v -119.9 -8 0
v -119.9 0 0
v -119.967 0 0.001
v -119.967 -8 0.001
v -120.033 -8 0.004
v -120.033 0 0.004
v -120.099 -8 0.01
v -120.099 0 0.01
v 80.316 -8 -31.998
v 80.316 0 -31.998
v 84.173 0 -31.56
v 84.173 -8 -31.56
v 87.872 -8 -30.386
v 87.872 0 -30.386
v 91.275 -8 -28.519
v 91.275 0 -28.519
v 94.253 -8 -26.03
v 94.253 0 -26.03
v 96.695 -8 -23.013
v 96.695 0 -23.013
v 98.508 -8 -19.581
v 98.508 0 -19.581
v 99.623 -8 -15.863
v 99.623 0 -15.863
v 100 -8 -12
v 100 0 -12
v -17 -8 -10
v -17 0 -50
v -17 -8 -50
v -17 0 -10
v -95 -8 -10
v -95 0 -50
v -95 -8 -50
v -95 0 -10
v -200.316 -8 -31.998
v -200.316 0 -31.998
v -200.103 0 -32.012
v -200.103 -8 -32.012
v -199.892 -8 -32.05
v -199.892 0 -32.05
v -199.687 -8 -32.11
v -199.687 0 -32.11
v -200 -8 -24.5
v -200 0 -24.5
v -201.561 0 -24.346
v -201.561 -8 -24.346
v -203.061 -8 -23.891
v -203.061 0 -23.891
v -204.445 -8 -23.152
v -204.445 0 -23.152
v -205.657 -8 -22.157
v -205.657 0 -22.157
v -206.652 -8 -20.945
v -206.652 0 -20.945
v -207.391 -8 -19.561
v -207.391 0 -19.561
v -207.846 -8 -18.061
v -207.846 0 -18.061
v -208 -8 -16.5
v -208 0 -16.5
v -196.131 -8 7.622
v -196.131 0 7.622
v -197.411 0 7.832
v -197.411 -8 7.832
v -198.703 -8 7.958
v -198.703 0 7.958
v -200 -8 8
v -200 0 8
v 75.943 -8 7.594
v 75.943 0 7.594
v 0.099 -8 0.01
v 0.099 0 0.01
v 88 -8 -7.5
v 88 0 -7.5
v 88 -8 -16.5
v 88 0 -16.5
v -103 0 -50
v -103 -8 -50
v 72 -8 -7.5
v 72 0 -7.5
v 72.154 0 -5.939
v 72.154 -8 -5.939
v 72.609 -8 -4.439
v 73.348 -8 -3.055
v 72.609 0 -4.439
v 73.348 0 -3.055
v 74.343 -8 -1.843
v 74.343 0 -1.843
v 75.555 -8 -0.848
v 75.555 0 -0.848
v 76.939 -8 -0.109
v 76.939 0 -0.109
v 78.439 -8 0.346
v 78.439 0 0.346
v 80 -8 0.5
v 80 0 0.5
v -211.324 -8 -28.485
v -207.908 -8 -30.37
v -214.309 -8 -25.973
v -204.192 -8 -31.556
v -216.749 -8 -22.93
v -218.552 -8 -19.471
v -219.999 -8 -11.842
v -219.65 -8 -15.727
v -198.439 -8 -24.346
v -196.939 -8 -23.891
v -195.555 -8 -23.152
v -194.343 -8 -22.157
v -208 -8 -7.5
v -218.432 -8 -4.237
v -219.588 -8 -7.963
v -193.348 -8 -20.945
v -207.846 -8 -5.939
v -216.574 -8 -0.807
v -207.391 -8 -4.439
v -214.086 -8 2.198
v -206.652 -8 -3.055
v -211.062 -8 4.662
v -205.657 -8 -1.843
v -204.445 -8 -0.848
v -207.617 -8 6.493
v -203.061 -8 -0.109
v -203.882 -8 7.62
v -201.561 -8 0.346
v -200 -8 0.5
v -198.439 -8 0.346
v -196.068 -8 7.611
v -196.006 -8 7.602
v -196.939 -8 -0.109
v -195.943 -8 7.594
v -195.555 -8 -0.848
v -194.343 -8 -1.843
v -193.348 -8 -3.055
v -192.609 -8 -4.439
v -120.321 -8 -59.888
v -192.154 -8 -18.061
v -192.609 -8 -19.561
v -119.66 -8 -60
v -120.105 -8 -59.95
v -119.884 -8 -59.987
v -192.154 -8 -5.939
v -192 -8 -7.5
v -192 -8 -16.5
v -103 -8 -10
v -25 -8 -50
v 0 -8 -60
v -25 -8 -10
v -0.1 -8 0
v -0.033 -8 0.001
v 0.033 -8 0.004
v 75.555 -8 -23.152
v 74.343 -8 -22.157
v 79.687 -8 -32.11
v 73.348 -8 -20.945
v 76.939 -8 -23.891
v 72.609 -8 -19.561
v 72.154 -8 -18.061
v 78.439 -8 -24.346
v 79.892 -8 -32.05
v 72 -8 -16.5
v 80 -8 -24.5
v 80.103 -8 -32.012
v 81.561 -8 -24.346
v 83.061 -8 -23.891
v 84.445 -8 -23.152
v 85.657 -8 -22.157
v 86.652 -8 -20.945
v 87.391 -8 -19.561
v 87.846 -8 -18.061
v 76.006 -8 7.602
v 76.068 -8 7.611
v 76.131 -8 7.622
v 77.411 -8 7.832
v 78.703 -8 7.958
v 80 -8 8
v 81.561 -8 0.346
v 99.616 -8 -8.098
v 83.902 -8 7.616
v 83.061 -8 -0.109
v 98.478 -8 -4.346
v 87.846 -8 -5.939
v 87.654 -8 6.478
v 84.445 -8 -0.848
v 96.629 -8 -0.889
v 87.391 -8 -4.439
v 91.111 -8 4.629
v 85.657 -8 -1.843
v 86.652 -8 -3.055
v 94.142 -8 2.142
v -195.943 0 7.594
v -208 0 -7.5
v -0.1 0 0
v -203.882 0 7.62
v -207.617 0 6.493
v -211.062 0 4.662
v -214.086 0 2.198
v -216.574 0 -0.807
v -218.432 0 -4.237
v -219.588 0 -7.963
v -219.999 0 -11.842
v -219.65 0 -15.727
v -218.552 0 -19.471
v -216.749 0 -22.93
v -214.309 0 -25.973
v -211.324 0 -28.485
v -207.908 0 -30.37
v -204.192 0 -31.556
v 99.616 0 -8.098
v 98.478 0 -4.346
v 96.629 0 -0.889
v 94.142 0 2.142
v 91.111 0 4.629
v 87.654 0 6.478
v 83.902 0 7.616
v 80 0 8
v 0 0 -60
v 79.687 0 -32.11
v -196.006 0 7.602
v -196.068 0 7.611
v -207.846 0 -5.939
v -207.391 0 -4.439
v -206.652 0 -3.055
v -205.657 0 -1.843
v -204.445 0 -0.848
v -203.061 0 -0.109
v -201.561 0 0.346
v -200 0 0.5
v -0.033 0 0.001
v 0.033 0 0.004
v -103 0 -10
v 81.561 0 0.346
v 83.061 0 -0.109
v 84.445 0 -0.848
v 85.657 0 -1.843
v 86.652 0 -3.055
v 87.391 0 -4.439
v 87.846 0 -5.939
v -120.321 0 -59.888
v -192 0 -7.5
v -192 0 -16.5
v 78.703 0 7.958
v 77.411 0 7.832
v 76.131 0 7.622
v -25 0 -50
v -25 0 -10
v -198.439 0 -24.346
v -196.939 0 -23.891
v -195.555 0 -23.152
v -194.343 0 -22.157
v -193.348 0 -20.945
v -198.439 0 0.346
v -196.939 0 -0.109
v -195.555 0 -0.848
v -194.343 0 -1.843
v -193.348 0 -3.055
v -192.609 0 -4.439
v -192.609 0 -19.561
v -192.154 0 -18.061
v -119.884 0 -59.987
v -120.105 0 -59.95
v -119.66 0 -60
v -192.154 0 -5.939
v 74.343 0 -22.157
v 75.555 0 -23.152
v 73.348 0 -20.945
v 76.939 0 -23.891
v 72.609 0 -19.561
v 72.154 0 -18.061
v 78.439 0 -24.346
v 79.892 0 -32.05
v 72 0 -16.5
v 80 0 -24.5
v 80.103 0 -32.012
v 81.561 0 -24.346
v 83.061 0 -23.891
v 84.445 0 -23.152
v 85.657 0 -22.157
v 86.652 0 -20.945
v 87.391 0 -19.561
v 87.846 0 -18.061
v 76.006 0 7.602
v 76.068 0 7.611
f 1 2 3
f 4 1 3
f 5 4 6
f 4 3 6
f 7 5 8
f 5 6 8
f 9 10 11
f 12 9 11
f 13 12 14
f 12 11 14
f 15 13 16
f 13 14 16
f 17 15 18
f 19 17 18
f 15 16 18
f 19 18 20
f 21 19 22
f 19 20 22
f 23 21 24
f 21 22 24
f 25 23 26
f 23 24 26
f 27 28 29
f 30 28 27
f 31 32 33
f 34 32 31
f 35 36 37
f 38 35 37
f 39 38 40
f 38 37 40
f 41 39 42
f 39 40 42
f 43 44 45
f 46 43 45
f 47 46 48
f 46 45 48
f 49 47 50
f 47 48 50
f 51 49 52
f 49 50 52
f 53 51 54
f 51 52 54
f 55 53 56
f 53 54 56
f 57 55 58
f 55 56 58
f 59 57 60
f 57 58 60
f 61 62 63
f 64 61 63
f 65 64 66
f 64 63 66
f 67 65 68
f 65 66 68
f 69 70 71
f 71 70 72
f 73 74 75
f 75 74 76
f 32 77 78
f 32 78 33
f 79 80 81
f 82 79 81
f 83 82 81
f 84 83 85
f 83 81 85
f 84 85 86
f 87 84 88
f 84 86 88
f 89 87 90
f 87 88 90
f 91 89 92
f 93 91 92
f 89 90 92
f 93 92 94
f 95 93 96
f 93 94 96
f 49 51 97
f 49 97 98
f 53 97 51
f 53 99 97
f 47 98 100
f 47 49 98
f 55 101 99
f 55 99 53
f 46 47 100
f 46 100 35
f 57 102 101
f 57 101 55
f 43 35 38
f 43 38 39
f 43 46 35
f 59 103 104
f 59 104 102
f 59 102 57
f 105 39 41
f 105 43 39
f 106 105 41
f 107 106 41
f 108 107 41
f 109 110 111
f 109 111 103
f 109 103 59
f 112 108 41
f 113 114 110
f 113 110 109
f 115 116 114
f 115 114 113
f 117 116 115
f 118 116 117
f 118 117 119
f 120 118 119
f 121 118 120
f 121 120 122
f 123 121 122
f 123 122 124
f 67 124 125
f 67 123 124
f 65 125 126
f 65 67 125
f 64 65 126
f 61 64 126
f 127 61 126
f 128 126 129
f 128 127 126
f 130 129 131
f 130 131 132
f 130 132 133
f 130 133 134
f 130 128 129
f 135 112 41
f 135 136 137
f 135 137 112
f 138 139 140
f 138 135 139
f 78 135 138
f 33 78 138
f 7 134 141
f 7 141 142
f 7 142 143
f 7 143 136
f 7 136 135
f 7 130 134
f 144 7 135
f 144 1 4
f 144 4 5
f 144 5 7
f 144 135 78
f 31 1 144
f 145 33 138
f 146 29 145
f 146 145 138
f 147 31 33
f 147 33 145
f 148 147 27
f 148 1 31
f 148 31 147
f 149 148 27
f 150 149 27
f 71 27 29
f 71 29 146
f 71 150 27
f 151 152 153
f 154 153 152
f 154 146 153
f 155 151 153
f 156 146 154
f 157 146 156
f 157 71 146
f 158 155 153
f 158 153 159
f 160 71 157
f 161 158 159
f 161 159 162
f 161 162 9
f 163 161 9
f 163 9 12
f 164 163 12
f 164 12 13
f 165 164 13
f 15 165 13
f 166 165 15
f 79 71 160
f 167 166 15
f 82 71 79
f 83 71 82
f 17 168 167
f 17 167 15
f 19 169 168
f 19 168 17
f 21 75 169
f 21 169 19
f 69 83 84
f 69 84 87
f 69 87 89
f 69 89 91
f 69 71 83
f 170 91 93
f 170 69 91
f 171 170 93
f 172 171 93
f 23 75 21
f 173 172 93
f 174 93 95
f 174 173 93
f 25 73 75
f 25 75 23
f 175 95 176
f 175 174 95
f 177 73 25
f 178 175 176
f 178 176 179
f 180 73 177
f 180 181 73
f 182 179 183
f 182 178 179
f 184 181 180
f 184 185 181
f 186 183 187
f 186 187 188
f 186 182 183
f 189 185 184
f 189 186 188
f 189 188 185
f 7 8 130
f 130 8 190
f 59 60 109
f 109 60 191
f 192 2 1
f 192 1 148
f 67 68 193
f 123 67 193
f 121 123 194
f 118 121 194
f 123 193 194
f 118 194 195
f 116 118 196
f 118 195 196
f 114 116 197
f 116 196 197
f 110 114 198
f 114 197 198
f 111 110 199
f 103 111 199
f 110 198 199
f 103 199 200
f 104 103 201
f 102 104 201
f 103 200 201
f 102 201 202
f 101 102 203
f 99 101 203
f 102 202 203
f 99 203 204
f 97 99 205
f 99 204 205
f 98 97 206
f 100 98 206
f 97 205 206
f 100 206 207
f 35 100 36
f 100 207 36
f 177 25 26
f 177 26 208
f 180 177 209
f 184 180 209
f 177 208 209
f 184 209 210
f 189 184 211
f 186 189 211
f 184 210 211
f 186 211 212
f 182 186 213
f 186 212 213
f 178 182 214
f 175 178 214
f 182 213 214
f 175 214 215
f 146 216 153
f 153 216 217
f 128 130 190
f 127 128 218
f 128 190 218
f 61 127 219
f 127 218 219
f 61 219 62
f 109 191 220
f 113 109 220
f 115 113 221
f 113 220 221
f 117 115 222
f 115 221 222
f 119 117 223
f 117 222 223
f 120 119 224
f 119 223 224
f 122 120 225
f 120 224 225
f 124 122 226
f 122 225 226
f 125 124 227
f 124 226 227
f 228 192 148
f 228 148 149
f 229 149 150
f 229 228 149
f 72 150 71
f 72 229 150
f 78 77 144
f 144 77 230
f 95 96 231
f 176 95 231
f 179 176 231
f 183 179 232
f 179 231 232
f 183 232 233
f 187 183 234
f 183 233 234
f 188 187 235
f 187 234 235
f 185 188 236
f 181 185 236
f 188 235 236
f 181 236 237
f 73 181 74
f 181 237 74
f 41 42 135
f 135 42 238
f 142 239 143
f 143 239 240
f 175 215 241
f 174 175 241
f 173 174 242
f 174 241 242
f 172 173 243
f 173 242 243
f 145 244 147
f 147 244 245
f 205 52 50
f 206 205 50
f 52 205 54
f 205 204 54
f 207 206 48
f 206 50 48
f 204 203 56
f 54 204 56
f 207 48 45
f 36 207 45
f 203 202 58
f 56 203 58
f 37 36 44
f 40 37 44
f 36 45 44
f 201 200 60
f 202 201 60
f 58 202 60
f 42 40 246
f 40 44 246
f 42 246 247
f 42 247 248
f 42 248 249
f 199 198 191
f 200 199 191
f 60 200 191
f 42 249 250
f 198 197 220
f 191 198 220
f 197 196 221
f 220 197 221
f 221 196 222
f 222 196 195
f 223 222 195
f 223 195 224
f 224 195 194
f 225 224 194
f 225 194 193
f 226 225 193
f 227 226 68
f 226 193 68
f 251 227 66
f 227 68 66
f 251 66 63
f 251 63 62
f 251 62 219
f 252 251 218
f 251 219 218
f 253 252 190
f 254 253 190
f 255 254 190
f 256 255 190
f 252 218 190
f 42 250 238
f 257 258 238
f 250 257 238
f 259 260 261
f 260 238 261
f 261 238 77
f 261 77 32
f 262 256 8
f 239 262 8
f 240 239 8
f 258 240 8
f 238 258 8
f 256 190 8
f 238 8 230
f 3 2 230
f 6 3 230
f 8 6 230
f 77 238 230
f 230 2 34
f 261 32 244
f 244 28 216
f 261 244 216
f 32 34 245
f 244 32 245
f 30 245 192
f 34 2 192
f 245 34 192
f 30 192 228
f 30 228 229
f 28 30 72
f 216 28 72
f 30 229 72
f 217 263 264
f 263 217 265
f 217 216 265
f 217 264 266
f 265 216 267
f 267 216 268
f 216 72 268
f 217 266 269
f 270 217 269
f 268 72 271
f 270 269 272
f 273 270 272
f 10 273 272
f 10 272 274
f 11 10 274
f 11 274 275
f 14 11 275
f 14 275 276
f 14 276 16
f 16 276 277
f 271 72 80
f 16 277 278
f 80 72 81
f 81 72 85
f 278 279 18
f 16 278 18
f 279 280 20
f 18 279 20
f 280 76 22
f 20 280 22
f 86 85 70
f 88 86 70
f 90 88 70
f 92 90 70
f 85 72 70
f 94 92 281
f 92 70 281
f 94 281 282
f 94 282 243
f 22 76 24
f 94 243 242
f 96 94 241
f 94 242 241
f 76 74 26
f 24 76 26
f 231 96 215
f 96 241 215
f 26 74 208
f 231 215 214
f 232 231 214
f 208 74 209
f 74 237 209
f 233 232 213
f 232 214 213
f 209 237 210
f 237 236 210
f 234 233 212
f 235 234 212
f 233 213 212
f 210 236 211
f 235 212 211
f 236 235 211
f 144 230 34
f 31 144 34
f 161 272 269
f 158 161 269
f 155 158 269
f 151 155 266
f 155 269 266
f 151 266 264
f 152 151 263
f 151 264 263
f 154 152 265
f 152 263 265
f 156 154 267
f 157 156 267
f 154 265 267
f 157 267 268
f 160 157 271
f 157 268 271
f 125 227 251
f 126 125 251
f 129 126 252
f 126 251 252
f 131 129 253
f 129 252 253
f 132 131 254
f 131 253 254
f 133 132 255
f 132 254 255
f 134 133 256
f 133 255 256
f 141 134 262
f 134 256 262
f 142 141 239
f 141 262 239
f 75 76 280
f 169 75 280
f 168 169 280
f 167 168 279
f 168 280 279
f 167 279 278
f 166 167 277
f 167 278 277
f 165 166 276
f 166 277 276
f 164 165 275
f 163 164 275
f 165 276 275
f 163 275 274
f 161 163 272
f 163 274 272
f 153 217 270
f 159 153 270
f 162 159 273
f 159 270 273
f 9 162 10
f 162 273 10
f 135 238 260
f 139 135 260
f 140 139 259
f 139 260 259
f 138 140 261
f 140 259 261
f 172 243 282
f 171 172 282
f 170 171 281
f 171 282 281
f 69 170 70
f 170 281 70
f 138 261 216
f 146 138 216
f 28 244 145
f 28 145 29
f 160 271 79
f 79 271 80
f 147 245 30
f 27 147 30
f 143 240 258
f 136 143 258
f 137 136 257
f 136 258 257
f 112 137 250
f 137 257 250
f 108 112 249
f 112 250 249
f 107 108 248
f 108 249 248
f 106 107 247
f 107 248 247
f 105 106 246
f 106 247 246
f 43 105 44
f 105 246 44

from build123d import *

# Parameters (mm, degrees)
F0_W        = 120
F0_H        = 60
F0_W_2      = 8
F0_H_2      = 40
F1_DEPTH    = 8
F2_T1_DEPTH = 8
F2_T3_DEPTH = 9.6994572863


# Not quite as in the source:
# - a fillet or chamfer that OpenCascade refuses, or shapes differently, is made with other operations: its cross-section is extruded or revolved along the edge and cut away or added


with BuildPart() as f1:
    # F0 (on Front) → F1 (new body)
    with BuildSketch(Plane.XZ):
        with Locations((-60, -30)):
            Rectangle(F0_W, F0_H)
        with Locations((-99, -30)):
            Rectangle(F0_W_2, F0_H_2, mode=Mode.SUBTRACT)
        with Locations((-21, -30)):
            Rectangle(F0_W_2, F0_H_2, mode=Mode.SUBTRACT)
        with BuildLine():
            Line((76.0396039604, 7.603960396), (0, 0))
            Line((0, 0), (0, -60))
            Line((0, -60), (80, -32))
            ThreePointArc((80, -32), (60.0992561958, -13.9900743804), (76.0396039604, 7.603960396))
        make_face()
        with BuildLine():
            Line((-120, -60), (-120, 0))
            Line((-120, 0), (-196.0396039604, 7.603960396))
            ThreePointArc((-196.0396039604, 7.603960396), (-184.5208540159, 0.6647558051), (-180, -12))
            ThreePointArc((-180, -12), (-185.8578643763, -26.1421356237), (-200, -32))
            Line((-200, -32), (-120, -60))
        make_face()
        with BuildLine():
            ThreePointArc((80, 8), (78.0099256196, 7.9007438042), (76.0396039604, 7.603960396))
            Line((76.0396039604, 7.603960396), (80, 8))
        make_face()
        with BuildLine():
            Line((80, 8), (76.0396039604, 7.603960396))
            ThreePointArc((76.0396039604, 7.603960396), (60.0992561958, -13.9900743804), (80, -32))
            Line((80, -32), (80, -24.5))
            ThreePointArc((80, -24.5), (74.3431457505, -22.1568542495), (72, -16.5))
            Line((72, -16.5), (72, -7.5))
            ThreePointArc((72, -7.5), (74.3431457505, -1.8431457505), (80, 0.5))
            Line((80, 0.5), (80, 8))
        make_face()
        with BuildLine():
            ThreePointArc((-180, -12), (-184.5208540159, 0.6647558051), (-196.0396039604, 7.603960396))
            Line((-196.0396039604, 7.603960396), (-200, 8))
            Line((-200, 8), (-200, 0.5))
            ThreePointArc((-200, 0.5), (-194.3431457505, -1.8431457505), (-192, -7.5))
            Line((-192, -7.5), (-192, -16.5))
            ThreePointArc((-192, -16.5), (-194.3431457505, -22.1568542495), (-200, -24.5))
            Line((-200, -24.5), (-200, -32))
            ThreePointArc((-200, -32), (-185.8578643763, -26.1421356237), (-180, -12))
        make_face()
        with BuildLine():
            Line((-200, 8), (-196.0396039604, 7.603960396))
            ThreePointArc((-196.0396039604, 7.603960396), (-198.0099256196, 7.9007438042), (-200, 8))
        make_face()
        with BuildLine():
            Line((80, -24.5), (80, -32))
            ThreePointArc((80, -32), (94.1421356237, -26.1421356237), (100, -12))
            ThreePointArc((100, -12), (94.1421356237, 2.1421356237), (80, 8))
            Line((80, 8), (80, 0.5))
            ThreePointArc((80, 0.5), (85.6568542495, -1.8431457505), (88, -7.5))
            Line((88, -7.5), (88, -16.5))
            ThreePointArc((88, -16.5), (85.6568542495, -22.1568542495), (80, -24.5))
        make_face()
        with BuildLine():
            ThreePointArc((-200, 8), (-220, -12), (-200, -32))
            Line((-200, -32), (-200, -24.5))
            ThreePointArc((-200, -24.5), (-205.6568542495, -22.1568542495), (-208, -16.5))
            Line((-208, -16.5), (-208, -7.5))
            ThreePointArc((-208, -7.5), (-205.6568542495, -1.8431457505), (-200, 0.5))
            Line((-200, 0.5), (-200, 8))
        make_face()
    extrude(amount=F1_DEPTH)

    # F2: fillet of radius 2 on 7 edges, made by hand

    # F2_s2 → F2_t1 (join)
    with BuildSketch(Plane.XZ):
        with BuildLine():
            ThreePointArc((-119.9002487578, 0), (-119.9998761615, 0.0024829462), (-120.0992561958, 0.0099256196))
            Line((-120.0992561958, 0.0099256196), (-120, 0))
            Line((-120, 0), (-119.9002487578, 0))
        make_face()
        with BuildLine():
            ThreePointArc((-0.0997512422, 0), (-0.0001238385, 0.0024829462), (0.0992561958, 0.0099256196))
            Line((0.0992561958, 0.0099256196), (0, 0))
            Line((0, 0), (-0.0997512422, 0))
        make_face()
        with BuildLine():
            ThreePointArc((-200.316131174, -31.9975013709), (-199.9970841579, -32.0282320894), (-199.687043442, -32.1095347953))
            Line((-199.687043442, -32.1095347953), (-200, -32))
            ThreePointArc((-200, -32), (-200.1580705241, -31.999375333), (-200.316131174, -31.9975013709))
        make_face()
        with BuildLine():
            ThreePointArc((79.687043442, -32.1095347953), (79.997084158, -32.0282320894), (80.316131174, -31.9975013709))
            ThreePointArc((80.316131174, -31.9975013709), (80.1580705241, -31.999375333), (80, -32))
            Line((80, -32), (79.687043442, -32.1095347953))
        make_face()
        with BuildLine():
            ThreePointArc((76.1306459256, 7.6221328873), (76.0370129468, 7.6059696483), (75.9427179562, 7.5942717956))
            Line((75.9427179562, 7.5942717956), (76.0396039604, 7.603960396))
            ThreePointArc((76.0396039604, 7.603960396), (76.0851143987, 7.6130994677), (76.1306459256, 7.6221328873))
        make_face()
        with BuildLine():
            ThreePointArc((-195.9427179562, 7.5942717956), (-196.0370129468, 7.6059696483), (-196.1306459256, 7.6221328873))
            ThreePointArc((-196.1306459256, 7.6221328873), (-196.0851143987, 7.6130994677), (-196.0396039604, 7.603960396))
            Line((-196.0396039604, 7.603960396), (-195.9427179562, 7.5942717956))
        make_face()
    extrude(amount=F2_T1_DEPTH)

    # F2_s4 → F2_t3 (cut)
    with BuildSketch(Plane.XZ.offset(-0.8497286432)):
        with BuildLine():
            ThreePointArc((-120.3208093922, -59.8877167127), (-119.9951955274, -59.9717293711), (-119.6601085427, -60))
            Line((-119.6601085427, -60), (-120, -60))
            Line((-120, -60), (-120.3208093922, -59.8877167127))
        make_face()
    extrude(amount=F2_T3_DEPTH, mode=Mode.SUBTRACT)


solid = f1.part
